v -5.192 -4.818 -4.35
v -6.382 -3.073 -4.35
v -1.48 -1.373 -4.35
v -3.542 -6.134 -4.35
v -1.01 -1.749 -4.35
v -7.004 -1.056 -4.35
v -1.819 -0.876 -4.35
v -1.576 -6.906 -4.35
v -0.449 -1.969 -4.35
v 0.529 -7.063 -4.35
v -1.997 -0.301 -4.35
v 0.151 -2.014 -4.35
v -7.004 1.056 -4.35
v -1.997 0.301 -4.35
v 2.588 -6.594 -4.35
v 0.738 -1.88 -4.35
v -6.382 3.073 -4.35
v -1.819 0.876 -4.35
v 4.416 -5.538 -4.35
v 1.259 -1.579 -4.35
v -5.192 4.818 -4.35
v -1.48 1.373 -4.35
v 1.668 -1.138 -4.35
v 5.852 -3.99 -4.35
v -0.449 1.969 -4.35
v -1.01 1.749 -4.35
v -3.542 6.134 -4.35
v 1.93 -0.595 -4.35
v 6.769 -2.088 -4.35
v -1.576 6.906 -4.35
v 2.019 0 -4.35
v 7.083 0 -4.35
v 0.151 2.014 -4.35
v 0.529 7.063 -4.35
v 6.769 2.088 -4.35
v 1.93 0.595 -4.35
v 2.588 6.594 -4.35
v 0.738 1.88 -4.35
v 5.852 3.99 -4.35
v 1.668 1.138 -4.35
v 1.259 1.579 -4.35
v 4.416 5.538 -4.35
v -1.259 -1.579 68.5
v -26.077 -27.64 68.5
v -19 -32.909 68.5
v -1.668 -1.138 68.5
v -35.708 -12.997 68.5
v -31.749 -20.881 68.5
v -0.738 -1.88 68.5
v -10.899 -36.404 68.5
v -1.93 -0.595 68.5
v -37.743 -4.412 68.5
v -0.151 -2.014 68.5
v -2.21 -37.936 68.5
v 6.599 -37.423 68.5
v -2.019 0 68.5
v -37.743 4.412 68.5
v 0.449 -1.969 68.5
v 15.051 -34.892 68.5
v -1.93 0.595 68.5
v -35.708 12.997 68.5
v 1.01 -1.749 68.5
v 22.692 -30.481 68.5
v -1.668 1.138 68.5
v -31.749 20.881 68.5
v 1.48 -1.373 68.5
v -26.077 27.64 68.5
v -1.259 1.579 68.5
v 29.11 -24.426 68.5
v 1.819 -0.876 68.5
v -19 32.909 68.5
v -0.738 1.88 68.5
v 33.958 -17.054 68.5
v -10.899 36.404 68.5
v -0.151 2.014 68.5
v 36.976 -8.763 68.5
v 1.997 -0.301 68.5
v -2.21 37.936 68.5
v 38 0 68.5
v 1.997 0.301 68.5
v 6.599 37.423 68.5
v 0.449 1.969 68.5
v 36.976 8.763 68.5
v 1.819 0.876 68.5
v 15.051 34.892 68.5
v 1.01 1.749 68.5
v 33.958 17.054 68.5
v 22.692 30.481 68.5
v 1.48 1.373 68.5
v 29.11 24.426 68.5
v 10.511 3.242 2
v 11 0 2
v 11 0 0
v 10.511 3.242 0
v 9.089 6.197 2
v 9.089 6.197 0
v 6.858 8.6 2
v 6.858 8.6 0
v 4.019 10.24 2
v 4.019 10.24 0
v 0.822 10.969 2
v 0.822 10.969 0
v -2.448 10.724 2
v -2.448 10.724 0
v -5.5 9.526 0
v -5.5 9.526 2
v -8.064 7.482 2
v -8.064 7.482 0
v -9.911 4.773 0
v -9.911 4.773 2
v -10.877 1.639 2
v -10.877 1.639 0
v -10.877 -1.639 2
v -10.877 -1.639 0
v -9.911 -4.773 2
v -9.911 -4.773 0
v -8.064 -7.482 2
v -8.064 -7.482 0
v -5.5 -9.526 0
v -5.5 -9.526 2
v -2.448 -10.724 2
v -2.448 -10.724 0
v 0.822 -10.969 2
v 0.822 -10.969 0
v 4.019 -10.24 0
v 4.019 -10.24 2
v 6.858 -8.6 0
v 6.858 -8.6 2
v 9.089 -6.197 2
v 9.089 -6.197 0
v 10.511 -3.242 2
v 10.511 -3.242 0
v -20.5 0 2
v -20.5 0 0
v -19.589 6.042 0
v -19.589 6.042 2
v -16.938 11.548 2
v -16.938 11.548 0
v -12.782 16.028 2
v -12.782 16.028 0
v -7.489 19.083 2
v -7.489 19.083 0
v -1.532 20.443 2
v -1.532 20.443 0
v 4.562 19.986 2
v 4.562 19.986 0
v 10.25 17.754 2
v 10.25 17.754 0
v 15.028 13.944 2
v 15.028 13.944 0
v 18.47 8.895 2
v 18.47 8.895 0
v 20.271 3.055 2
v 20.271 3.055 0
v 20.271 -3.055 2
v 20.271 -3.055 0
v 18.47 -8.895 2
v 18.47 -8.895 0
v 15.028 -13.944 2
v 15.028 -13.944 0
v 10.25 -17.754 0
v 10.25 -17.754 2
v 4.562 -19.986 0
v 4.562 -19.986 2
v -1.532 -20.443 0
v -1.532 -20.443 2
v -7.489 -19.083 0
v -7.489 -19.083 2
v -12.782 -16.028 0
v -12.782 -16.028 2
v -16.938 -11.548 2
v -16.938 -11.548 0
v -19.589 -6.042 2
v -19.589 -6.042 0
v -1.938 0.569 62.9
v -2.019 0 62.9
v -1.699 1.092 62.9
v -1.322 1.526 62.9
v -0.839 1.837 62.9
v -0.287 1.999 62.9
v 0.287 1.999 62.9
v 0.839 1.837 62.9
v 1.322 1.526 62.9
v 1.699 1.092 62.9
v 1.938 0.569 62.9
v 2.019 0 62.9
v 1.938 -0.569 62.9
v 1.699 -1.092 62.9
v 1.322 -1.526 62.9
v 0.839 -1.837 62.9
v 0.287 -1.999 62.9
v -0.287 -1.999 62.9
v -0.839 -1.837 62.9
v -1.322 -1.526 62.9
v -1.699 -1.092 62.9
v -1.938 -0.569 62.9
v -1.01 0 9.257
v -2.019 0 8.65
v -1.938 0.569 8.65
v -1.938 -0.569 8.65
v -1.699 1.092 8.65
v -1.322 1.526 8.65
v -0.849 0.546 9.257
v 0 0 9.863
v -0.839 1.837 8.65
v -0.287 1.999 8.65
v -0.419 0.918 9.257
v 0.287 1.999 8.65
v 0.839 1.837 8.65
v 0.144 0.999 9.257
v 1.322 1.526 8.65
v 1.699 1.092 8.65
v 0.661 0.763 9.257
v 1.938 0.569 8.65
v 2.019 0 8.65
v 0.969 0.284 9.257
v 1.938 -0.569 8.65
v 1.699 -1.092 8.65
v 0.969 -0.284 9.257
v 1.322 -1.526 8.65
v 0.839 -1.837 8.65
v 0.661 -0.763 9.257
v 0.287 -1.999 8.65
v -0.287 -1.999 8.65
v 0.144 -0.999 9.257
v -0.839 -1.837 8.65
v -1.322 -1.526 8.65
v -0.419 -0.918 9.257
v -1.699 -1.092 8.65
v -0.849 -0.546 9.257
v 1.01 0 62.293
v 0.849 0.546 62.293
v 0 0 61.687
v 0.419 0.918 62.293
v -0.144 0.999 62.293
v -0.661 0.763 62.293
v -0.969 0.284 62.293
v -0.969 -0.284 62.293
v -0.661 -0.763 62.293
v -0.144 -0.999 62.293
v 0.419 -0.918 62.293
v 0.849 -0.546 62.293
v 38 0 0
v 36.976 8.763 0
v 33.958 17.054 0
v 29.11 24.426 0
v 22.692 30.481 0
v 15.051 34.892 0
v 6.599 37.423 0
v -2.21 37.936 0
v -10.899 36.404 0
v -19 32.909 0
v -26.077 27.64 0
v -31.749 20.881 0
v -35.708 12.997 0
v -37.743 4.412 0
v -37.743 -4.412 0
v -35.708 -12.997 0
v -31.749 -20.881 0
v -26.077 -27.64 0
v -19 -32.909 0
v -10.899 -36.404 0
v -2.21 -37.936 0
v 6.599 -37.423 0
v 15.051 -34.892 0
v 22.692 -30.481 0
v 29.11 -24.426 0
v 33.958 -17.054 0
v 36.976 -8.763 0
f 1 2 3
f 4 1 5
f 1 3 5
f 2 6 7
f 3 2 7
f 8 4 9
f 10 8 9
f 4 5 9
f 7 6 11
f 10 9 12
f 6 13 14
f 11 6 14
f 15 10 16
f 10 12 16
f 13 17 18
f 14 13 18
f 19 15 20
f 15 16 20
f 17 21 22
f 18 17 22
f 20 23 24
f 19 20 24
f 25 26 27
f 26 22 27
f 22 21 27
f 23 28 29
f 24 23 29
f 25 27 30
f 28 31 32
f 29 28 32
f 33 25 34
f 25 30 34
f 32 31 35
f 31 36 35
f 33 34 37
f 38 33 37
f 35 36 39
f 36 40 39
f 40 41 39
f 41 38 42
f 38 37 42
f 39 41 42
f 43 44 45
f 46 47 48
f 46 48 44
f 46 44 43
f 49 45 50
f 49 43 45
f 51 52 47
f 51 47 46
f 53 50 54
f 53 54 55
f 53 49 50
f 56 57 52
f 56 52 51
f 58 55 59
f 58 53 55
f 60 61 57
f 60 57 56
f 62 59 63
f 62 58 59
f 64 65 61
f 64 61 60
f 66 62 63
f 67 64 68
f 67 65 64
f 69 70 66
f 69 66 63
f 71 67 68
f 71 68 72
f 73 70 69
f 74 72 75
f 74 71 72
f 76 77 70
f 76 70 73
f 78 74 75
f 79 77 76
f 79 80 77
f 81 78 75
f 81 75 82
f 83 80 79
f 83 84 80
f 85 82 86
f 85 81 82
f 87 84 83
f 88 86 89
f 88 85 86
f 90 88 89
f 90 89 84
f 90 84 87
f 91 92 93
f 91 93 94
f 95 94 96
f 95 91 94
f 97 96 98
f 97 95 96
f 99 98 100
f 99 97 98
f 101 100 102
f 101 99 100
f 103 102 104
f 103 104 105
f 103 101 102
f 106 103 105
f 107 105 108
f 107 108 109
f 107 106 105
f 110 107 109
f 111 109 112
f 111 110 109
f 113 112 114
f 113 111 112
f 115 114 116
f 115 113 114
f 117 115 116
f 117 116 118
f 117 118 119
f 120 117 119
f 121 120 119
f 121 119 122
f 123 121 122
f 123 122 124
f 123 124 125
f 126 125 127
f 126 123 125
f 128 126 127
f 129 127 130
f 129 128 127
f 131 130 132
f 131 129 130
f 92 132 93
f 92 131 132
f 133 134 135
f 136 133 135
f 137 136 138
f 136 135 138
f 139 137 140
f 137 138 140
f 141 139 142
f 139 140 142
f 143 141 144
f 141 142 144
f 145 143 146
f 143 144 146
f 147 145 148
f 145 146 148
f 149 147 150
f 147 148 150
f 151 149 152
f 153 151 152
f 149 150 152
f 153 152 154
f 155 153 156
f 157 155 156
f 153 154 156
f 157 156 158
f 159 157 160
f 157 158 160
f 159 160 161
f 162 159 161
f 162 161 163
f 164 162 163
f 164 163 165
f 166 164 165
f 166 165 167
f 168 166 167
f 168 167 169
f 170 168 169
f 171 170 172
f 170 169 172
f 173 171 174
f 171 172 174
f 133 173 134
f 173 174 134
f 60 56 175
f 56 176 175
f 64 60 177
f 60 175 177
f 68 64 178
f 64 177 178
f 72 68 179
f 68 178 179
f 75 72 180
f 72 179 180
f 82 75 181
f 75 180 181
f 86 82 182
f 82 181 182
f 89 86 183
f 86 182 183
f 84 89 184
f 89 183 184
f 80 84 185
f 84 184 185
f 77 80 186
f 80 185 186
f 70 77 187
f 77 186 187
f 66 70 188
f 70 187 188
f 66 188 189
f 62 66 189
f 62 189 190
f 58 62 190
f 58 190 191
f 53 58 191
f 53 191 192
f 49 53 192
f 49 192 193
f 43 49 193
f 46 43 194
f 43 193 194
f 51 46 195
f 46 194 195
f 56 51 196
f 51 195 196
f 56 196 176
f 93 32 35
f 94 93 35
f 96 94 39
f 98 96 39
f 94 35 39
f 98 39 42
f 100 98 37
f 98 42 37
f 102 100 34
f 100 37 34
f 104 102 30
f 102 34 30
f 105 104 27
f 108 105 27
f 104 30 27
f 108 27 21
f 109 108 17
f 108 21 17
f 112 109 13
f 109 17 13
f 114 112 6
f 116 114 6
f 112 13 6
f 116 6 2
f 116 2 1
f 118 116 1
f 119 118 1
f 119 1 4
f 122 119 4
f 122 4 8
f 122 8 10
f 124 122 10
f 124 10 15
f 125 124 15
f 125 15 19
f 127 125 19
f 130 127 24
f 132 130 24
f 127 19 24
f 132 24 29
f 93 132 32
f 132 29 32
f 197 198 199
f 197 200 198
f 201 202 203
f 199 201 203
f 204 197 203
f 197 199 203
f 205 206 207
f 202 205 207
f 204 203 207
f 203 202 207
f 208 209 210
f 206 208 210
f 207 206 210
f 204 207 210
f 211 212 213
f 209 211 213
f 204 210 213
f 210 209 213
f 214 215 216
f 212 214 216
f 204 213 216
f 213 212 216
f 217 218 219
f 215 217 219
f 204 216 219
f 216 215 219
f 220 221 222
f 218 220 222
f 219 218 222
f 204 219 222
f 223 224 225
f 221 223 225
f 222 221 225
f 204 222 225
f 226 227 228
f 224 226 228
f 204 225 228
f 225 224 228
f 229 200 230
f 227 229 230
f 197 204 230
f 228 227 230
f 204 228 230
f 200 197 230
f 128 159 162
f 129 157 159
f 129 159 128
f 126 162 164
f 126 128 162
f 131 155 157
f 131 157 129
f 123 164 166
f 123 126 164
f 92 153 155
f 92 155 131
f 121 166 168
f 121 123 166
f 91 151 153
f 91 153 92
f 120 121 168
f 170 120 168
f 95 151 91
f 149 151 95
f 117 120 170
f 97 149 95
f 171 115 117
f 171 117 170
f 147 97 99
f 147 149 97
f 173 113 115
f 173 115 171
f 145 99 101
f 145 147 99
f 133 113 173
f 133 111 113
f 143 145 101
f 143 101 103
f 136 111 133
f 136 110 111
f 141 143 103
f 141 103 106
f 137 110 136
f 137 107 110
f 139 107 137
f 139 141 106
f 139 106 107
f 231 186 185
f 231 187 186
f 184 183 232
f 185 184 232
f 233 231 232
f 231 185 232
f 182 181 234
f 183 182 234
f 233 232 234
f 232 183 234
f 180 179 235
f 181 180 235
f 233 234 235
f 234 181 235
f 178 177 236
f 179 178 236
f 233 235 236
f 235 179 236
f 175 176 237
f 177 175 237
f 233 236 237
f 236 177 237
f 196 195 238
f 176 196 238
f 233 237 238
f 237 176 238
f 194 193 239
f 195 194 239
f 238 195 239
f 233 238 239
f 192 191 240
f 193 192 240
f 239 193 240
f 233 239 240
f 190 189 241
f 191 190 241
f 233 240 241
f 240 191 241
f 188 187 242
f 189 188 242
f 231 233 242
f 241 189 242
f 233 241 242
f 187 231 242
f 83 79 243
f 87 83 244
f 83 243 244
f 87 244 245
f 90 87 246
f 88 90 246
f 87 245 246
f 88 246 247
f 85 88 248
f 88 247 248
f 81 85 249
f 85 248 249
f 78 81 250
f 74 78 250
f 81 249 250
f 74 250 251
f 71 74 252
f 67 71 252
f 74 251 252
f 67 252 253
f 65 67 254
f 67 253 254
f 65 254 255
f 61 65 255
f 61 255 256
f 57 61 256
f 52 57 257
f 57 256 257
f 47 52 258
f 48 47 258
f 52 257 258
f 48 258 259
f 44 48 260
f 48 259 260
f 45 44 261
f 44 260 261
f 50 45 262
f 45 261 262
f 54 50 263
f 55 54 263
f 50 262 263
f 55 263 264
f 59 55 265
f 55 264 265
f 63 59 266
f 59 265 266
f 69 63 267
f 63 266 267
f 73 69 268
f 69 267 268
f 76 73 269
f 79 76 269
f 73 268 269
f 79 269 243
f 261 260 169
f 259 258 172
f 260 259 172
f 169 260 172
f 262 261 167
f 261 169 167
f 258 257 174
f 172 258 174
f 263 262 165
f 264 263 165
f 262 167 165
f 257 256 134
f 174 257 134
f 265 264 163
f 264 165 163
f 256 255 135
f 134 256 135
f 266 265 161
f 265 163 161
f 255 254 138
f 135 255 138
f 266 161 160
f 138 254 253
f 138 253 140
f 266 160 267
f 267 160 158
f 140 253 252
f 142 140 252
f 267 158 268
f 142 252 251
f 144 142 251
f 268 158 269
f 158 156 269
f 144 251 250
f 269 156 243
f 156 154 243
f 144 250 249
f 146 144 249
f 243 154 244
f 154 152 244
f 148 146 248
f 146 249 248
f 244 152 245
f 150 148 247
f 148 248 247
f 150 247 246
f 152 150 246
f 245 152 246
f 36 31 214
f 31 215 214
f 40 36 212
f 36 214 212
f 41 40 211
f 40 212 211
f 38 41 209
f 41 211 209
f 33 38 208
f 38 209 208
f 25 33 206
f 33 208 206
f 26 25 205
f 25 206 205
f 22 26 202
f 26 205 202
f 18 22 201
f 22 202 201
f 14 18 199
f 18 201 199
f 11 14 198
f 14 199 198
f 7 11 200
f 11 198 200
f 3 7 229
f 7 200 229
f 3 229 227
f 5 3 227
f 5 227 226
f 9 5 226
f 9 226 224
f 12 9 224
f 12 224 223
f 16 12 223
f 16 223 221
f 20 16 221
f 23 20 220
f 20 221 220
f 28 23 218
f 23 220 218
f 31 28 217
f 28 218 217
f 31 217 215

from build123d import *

# Parameters (mm, degrees)
SKETCH1_R                  = 38
BOSS_EXTRUDE1_DEPTH        = 68.5
SKETCH3_R                  = 20.5
CUT_EXTRUDE1_DEPTH         = 2
SKETCH4_R                  = 11
BOSS_EXTRUDE3_DEPTH        = 6.35
CHAMFER1_SIZE              = 4.35
CHAMFER1_SIZE2             = 3.916757593
F_10_32_TAPPED_HOLE1_D     = 4.0386
F_10_32_TAPPED_HOLE1_DEPTH = 5.6
F_10_32_TAPPED_HOLE1_TIP   = 1.213317848
F_10_32_TAPPED_HOLE2_D     = 4.0386
F_10_32_TAPPED_HOLE2_DEPTH = 13
F_10_32_TAPPED_HOLE2_TIP   = 1.213317848


with BuildPart() as part:
    # Sketch1 → Boss-Extrude1 (new body)
    with BuildSketch(Plane.XY):
        Circle(SKETCH1_R)
    extrude(amount=BOSS_EXTRUDE1_DEPTH)

    # Sketch3 → Cut-Extrude1 (cut)
    with BuildSketch(Plane(origin=(0, 0, 0), x_dir=(-1, 0, 0), z_dir=(0, 0, -1))):
        Circle(SKETCH3_R)
    extrude(amount=-CUT_EXTRUDE1_DEPTH, mode=Mode.SUBTRACT)

    # Sketch4 → Boss-Extrude3 (add)
    with BuildSketch(Plane.XY.offset(2)):
        Circle(SKETCH4_R)
    extrude(amount=-BOSS_EXTRUDE3_DEPTH)

    # Chamfer1
    chamfer1_edges = [part.edges().sort_by_distance(p)[0] for p in [
        (-11, 0, -4.35),
    ]]
    chamfer1_side = [part.faces().sort_by_distance(p)[0] for p in [
        (-11, 0, -1.175),
    ]]
    chamfer(chamfer1_edges, length=CHAMFER1_SIZE, length2=CHAMFER1_SIZE2, reference=chamfer1_side[0])

    # #10-32 Tapped Hole1
    with Locations(Plane.XY.offset(68.5)):
        with Locations((0, 0)):
            Hole(F_10_32_TAPPED_HOLE1_D / 2, depth=F_10_32_TAPPED_HOLE1_DEPTH)
            with Locations((0, 0, -(F_10_32_TAPPED_HOLE1_DEPTH + F_10_32_TAPPED_HOLE1_TIP / 2))):  # 118° drill point
                Cone(0, F_10_32_TAPPED_HOLE1_D / 2, F_10_32_TAPPED_HOLE1_TIP, mode=Mode.SUBTRACT)

    # #10-32 Tapped Hole2
    with Locations(Plane(origin=(0, 0, -4.35), x_dir=(-1, 0, 0), z_dir=(0, 0, -1))):
        with Locations((0, 0)):
            Hole(F_10_32_TAPPED_HOLE2_D / 2, depth=F_10_32_TAPPED_HOLE2_DEPTH)
            with Locations((0, 0, -(F_10_32_TAPPED_HOLE2_DEPTH + F_10_32_TAPPED_HOLE2_TIP / 2))):  # 118° drill point
                Cone(0, F_10_32_TAPPED_HOLE2_D / 2, F_10_32_TAPPED_HOLE2_TIP, mode=Mode.SUBTRACT)


solid = part.part
